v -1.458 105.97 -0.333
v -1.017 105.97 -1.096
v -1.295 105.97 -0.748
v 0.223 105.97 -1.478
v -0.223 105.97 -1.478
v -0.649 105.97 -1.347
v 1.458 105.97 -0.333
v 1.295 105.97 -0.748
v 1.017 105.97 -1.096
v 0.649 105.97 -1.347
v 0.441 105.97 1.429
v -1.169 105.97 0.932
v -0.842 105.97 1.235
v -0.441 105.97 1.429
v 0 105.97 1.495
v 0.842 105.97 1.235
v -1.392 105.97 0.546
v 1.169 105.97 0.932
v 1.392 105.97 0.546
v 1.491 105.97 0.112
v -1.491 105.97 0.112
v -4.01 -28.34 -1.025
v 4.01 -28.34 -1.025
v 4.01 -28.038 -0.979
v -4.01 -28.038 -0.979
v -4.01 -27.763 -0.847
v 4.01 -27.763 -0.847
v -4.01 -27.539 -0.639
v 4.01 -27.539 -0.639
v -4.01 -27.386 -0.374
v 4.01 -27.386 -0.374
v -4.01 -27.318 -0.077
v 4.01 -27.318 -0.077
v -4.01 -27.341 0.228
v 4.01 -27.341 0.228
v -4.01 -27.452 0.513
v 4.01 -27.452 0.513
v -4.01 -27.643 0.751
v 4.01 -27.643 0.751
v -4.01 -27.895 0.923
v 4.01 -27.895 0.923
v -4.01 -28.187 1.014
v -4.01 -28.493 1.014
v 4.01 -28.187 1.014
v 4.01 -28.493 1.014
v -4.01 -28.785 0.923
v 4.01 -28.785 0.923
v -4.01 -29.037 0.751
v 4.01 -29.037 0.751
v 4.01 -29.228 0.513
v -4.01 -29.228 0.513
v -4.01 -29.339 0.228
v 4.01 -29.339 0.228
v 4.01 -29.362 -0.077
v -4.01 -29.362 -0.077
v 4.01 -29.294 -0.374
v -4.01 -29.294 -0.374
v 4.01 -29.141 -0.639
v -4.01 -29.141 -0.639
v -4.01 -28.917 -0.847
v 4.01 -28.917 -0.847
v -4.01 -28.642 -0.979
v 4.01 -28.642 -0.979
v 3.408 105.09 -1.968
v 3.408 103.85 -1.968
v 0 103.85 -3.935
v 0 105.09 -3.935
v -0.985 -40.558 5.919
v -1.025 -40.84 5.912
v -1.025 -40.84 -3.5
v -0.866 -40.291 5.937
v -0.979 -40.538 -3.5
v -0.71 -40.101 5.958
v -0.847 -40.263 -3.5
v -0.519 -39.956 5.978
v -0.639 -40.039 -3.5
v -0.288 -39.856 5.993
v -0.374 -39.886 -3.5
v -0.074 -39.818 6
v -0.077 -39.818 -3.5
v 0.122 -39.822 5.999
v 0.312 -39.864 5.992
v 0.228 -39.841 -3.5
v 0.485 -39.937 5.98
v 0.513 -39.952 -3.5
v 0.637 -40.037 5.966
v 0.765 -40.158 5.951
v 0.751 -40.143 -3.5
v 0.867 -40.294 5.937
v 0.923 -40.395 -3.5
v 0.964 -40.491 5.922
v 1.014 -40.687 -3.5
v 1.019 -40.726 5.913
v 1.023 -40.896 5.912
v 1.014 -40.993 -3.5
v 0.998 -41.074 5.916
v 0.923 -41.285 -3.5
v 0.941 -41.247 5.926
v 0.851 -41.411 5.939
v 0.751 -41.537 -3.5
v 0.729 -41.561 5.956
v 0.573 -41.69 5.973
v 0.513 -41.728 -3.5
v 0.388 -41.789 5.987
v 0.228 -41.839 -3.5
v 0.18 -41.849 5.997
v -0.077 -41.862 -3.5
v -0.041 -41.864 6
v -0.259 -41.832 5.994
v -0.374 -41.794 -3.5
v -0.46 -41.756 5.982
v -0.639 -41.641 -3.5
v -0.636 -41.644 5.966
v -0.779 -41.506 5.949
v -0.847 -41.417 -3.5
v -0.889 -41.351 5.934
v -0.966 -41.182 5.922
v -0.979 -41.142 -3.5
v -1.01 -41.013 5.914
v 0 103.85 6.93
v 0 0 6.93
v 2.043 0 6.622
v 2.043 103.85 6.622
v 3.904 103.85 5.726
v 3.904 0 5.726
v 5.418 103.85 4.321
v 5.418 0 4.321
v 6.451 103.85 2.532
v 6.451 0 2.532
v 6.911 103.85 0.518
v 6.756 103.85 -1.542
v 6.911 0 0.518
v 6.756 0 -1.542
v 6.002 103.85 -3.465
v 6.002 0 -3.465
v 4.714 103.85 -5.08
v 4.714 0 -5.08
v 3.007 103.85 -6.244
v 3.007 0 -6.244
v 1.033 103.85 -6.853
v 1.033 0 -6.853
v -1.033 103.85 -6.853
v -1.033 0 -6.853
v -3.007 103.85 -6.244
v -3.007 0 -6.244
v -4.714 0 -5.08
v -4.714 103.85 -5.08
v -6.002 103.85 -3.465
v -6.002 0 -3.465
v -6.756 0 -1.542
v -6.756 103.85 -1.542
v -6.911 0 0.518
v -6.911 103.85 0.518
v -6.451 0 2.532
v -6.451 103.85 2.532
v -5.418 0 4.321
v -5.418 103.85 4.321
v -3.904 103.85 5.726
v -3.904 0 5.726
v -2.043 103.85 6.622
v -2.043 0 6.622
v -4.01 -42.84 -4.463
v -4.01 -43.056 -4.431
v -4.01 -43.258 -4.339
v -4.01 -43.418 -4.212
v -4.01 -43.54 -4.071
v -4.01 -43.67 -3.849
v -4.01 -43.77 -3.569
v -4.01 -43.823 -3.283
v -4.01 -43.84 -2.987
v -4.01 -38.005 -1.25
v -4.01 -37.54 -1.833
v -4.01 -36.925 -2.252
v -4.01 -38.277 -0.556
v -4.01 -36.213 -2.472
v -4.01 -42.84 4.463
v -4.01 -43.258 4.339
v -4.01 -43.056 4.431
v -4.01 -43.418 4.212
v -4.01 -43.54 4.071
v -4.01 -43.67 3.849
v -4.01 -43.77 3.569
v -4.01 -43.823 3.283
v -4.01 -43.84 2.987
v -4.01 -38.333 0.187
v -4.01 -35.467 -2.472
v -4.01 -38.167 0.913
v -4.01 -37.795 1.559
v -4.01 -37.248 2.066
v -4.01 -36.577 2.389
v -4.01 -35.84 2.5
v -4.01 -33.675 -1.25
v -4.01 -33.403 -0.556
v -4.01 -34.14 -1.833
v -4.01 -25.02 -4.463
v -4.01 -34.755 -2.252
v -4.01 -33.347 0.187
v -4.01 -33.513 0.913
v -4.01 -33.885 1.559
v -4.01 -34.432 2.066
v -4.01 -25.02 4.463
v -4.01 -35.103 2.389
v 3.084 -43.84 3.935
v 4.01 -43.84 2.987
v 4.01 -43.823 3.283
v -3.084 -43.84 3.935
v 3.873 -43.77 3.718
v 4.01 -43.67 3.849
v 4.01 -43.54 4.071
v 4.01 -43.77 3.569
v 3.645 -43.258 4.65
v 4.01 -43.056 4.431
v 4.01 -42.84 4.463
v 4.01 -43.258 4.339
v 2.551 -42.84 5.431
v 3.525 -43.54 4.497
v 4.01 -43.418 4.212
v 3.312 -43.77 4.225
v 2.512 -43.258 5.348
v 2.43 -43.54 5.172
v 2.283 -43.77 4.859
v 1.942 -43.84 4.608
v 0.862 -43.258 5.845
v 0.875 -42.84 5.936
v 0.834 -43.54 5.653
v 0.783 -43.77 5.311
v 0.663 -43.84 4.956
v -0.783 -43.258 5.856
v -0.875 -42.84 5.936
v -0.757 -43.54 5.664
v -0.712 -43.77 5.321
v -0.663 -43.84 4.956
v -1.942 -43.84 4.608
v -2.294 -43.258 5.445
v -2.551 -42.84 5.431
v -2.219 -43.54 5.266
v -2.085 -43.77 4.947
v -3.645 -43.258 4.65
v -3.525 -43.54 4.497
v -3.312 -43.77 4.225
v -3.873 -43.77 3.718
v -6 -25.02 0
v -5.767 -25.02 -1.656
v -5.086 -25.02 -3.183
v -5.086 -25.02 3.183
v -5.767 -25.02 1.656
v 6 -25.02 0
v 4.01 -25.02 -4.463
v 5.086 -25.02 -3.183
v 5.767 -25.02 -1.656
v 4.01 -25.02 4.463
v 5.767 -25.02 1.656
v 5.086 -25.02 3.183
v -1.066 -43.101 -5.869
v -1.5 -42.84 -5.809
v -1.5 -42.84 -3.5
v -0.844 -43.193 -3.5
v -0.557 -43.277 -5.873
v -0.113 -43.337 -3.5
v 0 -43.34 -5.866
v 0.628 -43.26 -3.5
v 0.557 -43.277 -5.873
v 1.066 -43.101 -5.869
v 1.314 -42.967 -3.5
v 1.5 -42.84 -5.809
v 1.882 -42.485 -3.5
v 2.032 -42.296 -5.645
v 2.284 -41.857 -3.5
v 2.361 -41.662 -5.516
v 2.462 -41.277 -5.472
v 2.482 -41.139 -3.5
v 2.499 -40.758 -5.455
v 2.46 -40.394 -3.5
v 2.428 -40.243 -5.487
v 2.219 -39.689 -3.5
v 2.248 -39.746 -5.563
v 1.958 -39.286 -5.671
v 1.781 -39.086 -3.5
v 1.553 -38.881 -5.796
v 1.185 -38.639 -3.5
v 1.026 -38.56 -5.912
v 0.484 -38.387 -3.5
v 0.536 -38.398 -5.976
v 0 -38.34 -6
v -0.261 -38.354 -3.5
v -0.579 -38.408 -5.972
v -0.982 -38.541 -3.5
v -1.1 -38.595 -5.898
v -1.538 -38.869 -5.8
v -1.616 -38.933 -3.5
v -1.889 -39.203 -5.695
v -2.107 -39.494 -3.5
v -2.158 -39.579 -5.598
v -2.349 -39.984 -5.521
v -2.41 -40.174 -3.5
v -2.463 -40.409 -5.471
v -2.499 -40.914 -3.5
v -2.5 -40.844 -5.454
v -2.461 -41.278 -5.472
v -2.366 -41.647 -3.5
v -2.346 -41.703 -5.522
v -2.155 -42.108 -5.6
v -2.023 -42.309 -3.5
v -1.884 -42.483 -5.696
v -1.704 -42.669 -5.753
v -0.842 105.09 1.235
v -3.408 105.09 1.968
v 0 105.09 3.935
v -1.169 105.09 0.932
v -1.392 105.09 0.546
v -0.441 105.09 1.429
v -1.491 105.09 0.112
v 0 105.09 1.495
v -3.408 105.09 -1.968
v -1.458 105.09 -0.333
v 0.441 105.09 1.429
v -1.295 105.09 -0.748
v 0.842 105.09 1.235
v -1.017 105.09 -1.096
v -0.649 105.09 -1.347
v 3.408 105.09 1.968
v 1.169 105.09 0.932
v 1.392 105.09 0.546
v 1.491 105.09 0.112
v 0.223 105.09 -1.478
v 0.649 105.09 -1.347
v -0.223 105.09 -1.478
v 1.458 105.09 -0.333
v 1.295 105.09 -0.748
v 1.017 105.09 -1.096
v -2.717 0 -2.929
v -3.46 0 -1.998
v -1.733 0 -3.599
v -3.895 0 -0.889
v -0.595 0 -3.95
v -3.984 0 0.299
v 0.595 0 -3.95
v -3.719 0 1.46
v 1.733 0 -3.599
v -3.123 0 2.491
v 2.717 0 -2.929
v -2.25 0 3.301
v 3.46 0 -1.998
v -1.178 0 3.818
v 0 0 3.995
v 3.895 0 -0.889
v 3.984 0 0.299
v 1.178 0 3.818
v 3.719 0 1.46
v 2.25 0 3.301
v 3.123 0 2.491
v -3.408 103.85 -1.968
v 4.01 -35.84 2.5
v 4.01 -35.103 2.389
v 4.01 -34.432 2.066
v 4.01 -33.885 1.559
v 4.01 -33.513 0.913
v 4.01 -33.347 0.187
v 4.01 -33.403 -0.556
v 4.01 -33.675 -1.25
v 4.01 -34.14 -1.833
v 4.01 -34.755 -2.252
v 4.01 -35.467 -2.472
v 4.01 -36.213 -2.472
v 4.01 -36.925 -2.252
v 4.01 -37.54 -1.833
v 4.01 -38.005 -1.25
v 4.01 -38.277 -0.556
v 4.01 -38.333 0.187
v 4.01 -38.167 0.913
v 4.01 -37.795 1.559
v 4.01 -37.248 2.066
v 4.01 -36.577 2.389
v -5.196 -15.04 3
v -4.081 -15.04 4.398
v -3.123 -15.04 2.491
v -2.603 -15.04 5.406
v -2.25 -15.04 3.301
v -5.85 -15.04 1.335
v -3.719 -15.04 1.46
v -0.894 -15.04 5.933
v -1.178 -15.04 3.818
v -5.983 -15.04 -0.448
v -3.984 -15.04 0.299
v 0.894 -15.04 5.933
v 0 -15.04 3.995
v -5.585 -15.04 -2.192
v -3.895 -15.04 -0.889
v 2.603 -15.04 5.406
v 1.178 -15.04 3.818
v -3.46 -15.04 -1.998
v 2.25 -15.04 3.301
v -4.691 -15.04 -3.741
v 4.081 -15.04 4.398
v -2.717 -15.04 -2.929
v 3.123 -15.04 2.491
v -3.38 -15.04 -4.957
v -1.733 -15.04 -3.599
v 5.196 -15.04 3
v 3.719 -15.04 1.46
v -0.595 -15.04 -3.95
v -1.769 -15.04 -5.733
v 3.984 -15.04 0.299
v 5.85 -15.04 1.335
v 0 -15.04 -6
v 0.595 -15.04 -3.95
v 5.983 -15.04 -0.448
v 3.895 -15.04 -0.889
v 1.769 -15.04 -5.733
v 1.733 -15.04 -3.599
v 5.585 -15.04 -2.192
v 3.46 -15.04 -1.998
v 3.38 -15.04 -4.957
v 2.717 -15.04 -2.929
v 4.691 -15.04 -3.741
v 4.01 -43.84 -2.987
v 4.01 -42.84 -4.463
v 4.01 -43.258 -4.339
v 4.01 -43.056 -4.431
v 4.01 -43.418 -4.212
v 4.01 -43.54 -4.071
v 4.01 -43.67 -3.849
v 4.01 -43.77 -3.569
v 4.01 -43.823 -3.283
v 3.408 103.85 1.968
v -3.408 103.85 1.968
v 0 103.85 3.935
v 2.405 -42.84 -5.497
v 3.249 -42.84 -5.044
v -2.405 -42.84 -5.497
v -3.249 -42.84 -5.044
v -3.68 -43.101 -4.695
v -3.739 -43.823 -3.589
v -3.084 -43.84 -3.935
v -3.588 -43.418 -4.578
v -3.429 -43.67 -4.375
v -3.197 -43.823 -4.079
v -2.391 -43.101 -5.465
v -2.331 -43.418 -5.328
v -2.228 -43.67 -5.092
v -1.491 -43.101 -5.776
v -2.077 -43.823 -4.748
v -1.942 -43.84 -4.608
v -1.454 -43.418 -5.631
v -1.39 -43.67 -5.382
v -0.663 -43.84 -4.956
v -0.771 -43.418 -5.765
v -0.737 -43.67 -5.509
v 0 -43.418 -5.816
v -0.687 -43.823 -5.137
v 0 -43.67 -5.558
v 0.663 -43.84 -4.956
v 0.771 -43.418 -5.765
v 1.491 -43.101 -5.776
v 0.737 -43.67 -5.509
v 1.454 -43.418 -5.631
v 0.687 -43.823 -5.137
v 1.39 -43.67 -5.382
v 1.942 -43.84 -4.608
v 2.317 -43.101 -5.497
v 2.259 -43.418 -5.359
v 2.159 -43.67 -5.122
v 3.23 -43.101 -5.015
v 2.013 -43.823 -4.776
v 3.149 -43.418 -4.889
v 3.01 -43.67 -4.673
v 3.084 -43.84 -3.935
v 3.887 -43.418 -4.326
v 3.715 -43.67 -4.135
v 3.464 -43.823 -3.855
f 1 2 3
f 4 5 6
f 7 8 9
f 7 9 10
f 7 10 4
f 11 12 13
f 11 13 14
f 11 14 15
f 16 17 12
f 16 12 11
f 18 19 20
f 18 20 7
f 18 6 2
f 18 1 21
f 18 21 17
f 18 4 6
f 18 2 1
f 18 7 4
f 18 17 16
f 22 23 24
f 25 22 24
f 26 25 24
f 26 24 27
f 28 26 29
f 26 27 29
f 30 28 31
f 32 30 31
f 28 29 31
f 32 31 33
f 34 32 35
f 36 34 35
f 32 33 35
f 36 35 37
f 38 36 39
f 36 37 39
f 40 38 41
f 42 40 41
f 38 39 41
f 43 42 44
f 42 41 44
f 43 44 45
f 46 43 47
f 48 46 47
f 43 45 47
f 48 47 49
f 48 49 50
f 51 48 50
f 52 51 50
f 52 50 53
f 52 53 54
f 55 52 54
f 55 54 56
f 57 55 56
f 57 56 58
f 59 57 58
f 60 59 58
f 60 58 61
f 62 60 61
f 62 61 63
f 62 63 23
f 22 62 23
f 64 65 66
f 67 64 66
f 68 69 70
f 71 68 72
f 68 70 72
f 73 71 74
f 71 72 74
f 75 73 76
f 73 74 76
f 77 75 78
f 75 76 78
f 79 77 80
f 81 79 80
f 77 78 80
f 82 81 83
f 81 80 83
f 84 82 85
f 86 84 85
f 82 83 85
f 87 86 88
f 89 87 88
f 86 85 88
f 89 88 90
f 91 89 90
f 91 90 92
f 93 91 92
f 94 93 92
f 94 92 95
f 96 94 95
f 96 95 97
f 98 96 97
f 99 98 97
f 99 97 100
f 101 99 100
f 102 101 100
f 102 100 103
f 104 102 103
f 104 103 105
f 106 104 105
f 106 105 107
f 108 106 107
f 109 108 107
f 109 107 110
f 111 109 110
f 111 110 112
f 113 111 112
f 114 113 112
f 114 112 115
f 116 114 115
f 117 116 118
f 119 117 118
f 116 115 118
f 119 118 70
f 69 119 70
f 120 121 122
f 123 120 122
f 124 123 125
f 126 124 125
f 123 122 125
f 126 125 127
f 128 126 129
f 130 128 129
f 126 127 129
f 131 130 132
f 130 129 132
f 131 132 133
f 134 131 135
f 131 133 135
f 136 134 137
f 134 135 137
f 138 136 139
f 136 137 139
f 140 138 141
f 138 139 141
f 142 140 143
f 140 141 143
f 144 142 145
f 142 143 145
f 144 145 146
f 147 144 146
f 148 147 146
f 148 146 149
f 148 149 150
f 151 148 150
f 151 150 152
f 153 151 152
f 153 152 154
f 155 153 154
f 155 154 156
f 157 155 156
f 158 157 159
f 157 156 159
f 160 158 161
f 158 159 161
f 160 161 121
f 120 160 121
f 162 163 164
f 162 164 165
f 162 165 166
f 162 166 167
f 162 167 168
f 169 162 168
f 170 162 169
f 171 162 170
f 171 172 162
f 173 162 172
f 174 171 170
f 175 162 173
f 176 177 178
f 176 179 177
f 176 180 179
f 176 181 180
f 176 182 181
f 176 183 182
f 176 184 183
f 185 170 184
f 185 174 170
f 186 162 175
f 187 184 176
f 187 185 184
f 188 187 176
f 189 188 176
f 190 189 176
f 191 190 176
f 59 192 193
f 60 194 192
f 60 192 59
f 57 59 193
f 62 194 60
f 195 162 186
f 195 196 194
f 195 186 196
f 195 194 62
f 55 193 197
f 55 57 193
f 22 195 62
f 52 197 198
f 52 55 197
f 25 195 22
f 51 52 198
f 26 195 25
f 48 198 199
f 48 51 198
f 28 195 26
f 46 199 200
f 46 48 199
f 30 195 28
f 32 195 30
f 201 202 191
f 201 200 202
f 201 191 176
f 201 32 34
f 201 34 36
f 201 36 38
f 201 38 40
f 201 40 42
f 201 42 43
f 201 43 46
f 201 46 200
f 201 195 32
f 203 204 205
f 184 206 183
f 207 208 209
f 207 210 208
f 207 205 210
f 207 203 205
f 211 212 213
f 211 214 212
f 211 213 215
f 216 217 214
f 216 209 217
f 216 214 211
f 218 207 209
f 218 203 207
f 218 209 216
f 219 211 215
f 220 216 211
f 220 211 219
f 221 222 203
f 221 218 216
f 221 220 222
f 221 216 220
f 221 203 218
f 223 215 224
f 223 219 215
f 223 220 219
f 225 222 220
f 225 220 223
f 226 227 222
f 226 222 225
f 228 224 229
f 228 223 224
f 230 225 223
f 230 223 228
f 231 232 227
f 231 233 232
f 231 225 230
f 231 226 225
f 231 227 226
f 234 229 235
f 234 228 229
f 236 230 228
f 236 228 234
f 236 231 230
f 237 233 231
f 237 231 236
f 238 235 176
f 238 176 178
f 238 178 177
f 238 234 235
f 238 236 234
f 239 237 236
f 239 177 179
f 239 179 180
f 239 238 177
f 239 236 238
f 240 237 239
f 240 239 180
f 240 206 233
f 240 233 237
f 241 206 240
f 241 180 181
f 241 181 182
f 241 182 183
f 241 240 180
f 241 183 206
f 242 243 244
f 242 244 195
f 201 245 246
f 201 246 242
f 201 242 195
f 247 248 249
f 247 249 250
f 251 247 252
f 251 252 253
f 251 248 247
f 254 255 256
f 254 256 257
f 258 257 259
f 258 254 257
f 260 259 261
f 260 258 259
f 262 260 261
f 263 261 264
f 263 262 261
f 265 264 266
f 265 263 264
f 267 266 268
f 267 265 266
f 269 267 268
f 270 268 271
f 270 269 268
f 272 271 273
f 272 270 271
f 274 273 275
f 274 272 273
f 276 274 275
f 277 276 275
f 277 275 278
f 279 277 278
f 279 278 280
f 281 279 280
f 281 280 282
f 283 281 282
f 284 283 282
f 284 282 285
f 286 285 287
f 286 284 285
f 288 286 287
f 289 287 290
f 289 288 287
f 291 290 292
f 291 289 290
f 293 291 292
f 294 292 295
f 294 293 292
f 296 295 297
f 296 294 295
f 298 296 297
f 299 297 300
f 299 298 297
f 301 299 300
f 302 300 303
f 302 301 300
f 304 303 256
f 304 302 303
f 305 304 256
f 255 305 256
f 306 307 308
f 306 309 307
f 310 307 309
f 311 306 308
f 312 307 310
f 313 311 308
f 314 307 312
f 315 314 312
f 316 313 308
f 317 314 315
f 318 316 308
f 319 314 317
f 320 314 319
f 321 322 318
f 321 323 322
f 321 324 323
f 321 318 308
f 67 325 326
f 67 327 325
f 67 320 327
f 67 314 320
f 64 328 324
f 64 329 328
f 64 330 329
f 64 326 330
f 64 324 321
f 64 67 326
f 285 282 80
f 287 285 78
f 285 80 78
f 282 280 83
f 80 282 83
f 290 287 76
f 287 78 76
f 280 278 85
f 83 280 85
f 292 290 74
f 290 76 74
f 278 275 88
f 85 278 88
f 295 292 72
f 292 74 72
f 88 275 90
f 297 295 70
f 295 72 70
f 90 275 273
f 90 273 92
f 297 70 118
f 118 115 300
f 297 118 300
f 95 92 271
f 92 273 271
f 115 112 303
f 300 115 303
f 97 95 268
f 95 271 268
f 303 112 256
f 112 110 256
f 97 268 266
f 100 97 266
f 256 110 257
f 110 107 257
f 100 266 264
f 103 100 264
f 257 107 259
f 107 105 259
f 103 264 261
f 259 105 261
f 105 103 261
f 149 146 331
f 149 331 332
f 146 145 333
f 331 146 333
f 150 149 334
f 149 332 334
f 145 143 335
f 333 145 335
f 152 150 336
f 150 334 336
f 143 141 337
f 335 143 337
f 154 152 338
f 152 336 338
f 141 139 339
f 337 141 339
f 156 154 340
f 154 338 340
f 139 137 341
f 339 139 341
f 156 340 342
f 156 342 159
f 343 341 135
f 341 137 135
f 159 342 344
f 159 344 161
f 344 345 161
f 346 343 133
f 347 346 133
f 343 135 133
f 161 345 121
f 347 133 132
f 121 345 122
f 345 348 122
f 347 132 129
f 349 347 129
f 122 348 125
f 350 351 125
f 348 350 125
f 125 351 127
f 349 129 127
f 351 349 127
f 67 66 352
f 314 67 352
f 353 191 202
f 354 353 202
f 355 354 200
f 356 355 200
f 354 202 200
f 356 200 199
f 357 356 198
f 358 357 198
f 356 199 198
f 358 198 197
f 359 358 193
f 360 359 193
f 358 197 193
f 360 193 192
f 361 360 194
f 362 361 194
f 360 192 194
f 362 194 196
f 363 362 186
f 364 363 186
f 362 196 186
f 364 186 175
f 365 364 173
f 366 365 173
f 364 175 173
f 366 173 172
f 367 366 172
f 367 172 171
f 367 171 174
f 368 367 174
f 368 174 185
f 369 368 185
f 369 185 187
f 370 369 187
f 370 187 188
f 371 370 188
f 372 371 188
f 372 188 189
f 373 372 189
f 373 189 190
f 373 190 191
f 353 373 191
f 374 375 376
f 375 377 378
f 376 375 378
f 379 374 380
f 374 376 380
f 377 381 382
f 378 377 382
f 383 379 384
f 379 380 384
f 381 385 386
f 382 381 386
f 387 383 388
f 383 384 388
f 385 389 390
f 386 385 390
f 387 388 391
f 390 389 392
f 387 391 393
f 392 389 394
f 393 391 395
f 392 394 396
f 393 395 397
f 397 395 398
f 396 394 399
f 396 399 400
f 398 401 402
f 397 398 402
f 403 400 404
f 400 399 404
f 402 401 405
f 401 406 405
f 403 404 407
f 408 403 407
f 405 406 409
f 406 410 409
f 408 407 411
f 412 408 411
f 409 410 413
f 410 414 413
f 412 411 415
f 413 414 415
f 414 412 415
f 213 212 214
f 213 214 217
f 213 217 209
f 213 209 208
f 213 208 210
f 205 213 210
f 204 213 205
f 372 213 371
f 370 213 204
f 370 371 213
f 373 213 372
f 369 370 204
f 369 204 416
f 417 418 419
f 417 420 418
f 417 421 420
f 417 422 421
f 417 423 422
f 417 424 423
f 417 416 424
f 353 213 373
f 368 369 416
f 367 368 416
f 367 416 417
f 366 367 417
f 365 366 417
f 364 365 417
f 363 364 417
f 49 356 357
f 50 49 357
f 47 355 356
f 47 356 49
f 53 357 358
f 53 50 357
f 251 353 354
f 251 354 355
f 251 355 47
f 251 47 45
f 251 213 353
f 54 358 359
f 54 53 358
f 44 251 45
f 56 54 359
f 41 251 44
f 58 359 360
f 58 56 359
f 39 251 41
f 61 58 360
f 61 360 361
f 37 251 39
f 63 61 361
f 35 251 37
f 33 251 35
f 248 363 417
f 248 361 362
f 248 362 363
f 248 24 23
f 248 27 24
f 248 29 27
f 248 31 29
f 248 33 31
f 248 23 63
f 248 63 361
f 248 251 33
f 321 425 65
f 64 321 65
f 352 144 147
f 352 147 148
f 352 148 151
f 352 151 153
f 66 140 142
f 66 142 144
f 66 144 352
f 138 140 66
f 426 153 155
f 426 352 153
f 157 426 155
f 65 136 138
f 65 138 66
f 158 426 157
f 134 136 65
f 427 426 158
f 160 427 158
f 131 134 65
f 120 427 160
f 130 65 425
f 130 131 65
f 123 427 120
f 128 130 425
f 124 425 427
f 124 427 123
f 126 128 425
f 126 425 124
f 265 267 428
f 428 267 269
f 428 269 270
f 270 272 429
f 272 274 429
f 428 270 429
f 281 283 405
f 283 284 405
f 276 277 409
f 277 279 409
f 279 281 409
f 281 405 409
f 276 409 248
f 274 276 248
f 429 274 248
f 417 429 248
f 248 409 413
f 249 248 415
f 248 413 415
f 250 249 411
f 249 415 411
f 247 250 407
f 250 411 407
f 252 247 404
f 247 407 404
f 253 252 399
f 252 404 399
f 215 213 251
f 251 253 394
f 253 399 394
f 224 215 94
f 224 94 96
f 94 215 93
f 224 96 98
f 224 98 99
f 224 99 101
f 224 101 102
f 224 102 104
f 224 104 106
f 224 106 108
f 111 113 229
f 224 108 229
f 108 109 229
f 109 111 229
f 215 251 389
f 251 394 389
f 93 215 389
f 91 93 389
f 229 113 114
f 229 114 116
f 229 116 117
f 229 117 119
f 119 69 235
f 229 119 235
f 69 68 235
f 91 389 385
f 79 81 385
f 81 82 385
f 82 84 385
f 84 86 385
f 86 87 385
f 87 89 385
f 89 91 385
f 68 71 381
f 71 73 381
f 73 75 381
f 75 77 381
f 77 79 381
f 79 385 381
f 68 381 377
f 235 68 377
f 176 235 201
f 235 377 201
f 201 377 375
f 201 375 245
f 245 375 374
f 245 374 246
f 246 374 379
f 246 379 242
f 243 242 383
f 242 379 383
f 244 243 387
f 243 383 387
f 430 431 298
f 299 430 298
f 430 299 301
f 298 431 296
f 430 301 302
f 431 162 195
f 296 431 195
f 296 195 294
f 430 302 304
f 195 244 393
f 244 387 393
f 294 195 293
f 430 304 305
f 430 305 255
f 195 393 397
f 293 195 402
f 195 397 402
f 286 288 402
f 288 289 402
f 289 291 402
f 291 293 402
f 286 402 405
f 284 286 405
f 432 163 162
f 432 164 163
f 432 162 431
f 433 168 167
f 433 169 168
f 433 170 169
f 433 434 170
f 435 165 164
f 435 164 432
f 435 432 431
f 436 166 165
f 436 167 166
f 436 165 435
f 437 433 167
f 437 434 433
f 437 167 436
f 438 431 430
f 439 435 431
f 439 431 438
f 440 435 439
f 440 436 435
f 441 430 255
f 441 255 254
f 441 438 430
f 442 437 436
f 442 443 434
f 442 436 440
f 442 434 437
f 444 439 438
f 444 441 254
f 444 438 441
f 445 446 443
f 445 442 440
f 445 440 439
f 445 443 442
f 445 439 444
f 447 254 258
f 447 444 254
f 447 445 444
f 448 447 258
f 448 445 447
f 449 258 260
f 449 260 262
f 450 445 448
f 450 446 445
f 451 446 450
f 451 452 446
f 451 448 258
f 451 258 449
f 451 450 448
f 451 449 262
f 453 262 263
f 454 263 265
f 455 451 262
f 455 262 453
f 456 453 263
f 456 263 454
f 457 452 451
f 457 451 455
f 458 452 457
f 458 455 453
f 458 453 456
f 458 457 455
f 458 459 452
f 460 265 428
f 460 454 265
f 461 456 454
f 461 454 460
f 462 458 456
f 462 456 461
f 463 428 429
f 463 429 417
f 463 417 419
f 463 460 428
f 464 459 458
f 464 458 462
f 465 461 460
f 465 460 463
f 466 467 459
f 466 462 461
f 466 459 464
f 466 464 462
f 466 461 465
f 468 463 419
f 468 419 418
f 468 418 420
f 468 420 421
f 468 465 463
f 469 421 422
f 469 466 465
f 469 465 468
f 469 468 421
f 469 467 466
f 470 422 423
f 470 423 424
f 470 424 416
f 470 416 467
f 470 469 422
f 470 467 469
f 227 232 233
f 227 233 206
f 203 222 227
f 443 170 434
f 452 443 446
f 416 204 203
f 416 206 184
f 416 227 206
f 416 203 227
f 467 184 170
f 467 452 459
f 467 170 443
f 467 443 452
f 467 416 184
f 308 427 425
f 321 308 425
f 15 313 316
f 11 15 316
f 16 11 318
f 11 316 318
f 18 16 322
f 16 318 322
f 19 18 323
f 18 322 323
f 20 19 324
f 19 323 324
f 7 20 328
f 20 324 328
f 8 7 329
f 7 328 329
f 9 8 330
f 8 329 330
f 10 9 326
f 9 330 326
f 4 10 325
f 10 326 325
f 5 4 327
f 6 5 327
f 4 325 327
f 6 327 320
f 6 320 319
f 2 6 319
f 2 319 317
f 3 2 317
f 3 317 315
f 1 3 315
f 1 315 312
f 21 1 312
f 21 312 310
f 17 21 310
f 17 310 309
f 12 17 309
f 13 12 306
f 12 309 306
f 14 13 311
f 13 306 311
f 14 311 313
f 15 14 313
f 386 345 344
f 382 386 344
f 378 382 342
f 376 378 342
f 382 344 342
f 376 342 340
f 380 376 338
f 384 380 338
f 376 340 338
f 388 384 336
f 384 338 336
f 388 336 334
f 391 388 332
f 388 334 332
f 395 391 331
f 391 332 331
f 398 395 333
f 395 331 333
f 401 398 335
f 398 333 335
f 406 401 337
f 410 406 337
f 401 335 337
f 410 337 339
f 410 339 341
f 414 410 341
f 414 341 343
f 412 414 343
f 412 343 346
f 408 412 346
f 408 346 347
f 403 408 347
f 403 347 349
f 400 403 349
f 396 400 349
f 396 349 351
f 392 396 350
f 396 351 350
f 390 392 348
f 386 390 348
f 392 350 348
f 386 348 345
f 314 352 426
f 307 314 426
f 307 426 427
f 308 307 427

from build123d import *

# Parameters (mm, degrees)
SCHIZZO1_R                   = 6.93
ESTRUSIONE_ESTRUSIONE1_DEPTH = 103.85
ESTRUSIONE_ESTRUSIONE2_DEPTH = 1.24
SCHIZZO3_R                   = 1.495
ESTRUSIONE_ESTRUSIONE3_DEPTH = 0.88
SCHIZZO4_R                   = 3.995
ESTRUSIONE_ESTRUSIONE4_DEPTH = 15.04
SCHIZZO5_R                   = 6
ESTRUSIONE_ESTRUSIONE5_DEPTH = 28.8
TAGLIO_ESTRUSIONE1_START     = -18.82
TAGLIO_ESTRUSIONE1_DEPTH     = 18.82
SCHIZZO7_R                   = 2.5
TAGLIO_ESTRUSIONE2_DEPTH     = 107.758369227
FORO_FILETTATO_M2_5X0_45_1_D = 2.05
RACCORDO1_R                  = 1
FORO_FILETTATO_M2_5X0_45_2_D = 2.05
SCHIZZO12_R                  = 2.5
TAGLIO_ESTRUSIONE5_DEPTH     = 2.5


with BuildPart() as part:
    # Schizzo1 → Estrusione-Estrusione1 (new body)
    with BuildSketch(Plane(origin=(0, 0, 0), x_dir=(1, 0, 0), z_dir=(0, 1, 0))):
        with Locations(Location((0, 0, 0), (0, 0, 270))):
            Circle(SCHIZZO1_R)
    extrude(amount=ESTRUSIONE_ESTRUSIONE1_DEPTH)

    # Schizzo2 → Estrusione-Estrusione2 (add)
    with BuildSketch(Plane(origin=(0, 103.85, 0), x_dir=(1, 0, 0), z_dir=(0, 1, 0))):
        Polygon((-3.407809964, 1.9675), (-3.407809964, -1.9675), (0, -3.935), (3.407809964, -1.9675), (3.407809964, 1.9675), (0, 3.935), align=None)
    extrude(amount=ESTRUSIONE_ESTRUSIONE2_DEPTH)

    # Schizzo3 → Estrusione-Estrusione3 (add)
    with BuildSketch(Plane(origin=(0, 105.09, 0), x_dir=(1, 0, 0), z_dir=(0, 1, 0))):
        with Locations(Location((0, 0, 0), (0, 0, 270))):
            Circle(SCHIZZO3_R)
    extrude(amount=ESTRUSIONE_ESTRUSIONE3_DEPTH)

    # Schizzo4 → Estrusione-Estrusione4 (add)
    with BuildSketch(Plane(origin=(0, 0, 0), x_dir=(-1, 0, 0), z_dir=(0, -1, 0))):
        with Locations(Location((0, 0, 0), (0, 0, 270))):
            Circle(SCHIZZO4_R)
    extrude(amount=ESTRUSIONE_ESTRUSIONE4_DEPTH)

    # Schizzo5 → Estrusione-Estrusione5 (add)
    with BuildSketch(Plane.XZ.offset(15.04)):
        with Locations(Location((0, 0, 0), (0, 0, 270))):
            Circle(SCHIZZO5_R)
    extrude(amount=ESTRUSIONE_ESTRUSIONE5_DEPTH)

    # Schizzo6 → Taglio-Estrusione1 (cut)
    with BuildSketch(Plane.XZ.offset(43.84).offset(TAGLIO_ESTRUSIONE1_START)):
        with BuildLine():
            Line((-4.01, -4.463171518), (-4.01, 4.463171518))
            ThreePointArc((-4.01, 4.463171518), (-6, 0), (-4.01, -4.463171518))
        make_face()
        with BuildLine():
            ThreePointArc((6, 0), (5.479963504, 2.443358345), (4.01, 4.463171518))
            Line((4.01, 4.463171518), (4.01, -4.463171518))
            ThreePointArc((4.01, -4.463171518), (5.479963504, -2.443358345), (6, 0))
        make_face()
    extrude(amount=TAGLIO_ESTRUSIONE1_DEPTH, mode=Mode.SUBTRACT)

    # Schizzo7 → Taglio-Estrusione2 (cut, through all)
    with BuildSketch(Plane.ZY.offset(4.01)):
        with Locations((0, -35.84)):
            Circle(SCHIZZO7_R)
    extrude(amount=-TAGLIO_ESTRUSIONE2_DEPTH, mode=Mode.SUBTRACT)

    # Foro filettato M2.5x0.45-1 (through all)
    with Locations(Plane.ZY.offset(4.01)):
        with Locations((0, -28.34)):
            Hole(FORO_FILETTATO_M2_5X0_45_1_D / 2)

    # Raccordo1
    raccordo1_edges = [part.edges().sort_by_distance(p)[0] for p in [
        (2.1472041, -43.84, -5.602634608),
        (0, -43.84, 6),
    ]]
    fillet(raccordo1_edges, radius=RACCORDO1_R)

    # Foro filettato M2.5x0.45-2 (through all)
    with Locations(Plane(origin=(0, -40.84, 6), x_dir=(1, 0, 0), z_dir=(0, 0, 1))):
        with Locations((0, 0)):
            Hole(FORO_FILETTATO_M2_5X0_45_2_D / 2)

    # Schizzo12 → Taglio-Estrusione5 (cut)
    with BuildSketch(Plane.XY.offset(-6)):
        with Locations(Location((0, -40.84, 0), (0, 0, 233.130102354))):
            Circle(SCHIZZO12_R)
    extrude(amount=TAGLIO_ESTRUSIONE5_DEPTH, mode=Mode.SUBTRACT)


solid = part.part
